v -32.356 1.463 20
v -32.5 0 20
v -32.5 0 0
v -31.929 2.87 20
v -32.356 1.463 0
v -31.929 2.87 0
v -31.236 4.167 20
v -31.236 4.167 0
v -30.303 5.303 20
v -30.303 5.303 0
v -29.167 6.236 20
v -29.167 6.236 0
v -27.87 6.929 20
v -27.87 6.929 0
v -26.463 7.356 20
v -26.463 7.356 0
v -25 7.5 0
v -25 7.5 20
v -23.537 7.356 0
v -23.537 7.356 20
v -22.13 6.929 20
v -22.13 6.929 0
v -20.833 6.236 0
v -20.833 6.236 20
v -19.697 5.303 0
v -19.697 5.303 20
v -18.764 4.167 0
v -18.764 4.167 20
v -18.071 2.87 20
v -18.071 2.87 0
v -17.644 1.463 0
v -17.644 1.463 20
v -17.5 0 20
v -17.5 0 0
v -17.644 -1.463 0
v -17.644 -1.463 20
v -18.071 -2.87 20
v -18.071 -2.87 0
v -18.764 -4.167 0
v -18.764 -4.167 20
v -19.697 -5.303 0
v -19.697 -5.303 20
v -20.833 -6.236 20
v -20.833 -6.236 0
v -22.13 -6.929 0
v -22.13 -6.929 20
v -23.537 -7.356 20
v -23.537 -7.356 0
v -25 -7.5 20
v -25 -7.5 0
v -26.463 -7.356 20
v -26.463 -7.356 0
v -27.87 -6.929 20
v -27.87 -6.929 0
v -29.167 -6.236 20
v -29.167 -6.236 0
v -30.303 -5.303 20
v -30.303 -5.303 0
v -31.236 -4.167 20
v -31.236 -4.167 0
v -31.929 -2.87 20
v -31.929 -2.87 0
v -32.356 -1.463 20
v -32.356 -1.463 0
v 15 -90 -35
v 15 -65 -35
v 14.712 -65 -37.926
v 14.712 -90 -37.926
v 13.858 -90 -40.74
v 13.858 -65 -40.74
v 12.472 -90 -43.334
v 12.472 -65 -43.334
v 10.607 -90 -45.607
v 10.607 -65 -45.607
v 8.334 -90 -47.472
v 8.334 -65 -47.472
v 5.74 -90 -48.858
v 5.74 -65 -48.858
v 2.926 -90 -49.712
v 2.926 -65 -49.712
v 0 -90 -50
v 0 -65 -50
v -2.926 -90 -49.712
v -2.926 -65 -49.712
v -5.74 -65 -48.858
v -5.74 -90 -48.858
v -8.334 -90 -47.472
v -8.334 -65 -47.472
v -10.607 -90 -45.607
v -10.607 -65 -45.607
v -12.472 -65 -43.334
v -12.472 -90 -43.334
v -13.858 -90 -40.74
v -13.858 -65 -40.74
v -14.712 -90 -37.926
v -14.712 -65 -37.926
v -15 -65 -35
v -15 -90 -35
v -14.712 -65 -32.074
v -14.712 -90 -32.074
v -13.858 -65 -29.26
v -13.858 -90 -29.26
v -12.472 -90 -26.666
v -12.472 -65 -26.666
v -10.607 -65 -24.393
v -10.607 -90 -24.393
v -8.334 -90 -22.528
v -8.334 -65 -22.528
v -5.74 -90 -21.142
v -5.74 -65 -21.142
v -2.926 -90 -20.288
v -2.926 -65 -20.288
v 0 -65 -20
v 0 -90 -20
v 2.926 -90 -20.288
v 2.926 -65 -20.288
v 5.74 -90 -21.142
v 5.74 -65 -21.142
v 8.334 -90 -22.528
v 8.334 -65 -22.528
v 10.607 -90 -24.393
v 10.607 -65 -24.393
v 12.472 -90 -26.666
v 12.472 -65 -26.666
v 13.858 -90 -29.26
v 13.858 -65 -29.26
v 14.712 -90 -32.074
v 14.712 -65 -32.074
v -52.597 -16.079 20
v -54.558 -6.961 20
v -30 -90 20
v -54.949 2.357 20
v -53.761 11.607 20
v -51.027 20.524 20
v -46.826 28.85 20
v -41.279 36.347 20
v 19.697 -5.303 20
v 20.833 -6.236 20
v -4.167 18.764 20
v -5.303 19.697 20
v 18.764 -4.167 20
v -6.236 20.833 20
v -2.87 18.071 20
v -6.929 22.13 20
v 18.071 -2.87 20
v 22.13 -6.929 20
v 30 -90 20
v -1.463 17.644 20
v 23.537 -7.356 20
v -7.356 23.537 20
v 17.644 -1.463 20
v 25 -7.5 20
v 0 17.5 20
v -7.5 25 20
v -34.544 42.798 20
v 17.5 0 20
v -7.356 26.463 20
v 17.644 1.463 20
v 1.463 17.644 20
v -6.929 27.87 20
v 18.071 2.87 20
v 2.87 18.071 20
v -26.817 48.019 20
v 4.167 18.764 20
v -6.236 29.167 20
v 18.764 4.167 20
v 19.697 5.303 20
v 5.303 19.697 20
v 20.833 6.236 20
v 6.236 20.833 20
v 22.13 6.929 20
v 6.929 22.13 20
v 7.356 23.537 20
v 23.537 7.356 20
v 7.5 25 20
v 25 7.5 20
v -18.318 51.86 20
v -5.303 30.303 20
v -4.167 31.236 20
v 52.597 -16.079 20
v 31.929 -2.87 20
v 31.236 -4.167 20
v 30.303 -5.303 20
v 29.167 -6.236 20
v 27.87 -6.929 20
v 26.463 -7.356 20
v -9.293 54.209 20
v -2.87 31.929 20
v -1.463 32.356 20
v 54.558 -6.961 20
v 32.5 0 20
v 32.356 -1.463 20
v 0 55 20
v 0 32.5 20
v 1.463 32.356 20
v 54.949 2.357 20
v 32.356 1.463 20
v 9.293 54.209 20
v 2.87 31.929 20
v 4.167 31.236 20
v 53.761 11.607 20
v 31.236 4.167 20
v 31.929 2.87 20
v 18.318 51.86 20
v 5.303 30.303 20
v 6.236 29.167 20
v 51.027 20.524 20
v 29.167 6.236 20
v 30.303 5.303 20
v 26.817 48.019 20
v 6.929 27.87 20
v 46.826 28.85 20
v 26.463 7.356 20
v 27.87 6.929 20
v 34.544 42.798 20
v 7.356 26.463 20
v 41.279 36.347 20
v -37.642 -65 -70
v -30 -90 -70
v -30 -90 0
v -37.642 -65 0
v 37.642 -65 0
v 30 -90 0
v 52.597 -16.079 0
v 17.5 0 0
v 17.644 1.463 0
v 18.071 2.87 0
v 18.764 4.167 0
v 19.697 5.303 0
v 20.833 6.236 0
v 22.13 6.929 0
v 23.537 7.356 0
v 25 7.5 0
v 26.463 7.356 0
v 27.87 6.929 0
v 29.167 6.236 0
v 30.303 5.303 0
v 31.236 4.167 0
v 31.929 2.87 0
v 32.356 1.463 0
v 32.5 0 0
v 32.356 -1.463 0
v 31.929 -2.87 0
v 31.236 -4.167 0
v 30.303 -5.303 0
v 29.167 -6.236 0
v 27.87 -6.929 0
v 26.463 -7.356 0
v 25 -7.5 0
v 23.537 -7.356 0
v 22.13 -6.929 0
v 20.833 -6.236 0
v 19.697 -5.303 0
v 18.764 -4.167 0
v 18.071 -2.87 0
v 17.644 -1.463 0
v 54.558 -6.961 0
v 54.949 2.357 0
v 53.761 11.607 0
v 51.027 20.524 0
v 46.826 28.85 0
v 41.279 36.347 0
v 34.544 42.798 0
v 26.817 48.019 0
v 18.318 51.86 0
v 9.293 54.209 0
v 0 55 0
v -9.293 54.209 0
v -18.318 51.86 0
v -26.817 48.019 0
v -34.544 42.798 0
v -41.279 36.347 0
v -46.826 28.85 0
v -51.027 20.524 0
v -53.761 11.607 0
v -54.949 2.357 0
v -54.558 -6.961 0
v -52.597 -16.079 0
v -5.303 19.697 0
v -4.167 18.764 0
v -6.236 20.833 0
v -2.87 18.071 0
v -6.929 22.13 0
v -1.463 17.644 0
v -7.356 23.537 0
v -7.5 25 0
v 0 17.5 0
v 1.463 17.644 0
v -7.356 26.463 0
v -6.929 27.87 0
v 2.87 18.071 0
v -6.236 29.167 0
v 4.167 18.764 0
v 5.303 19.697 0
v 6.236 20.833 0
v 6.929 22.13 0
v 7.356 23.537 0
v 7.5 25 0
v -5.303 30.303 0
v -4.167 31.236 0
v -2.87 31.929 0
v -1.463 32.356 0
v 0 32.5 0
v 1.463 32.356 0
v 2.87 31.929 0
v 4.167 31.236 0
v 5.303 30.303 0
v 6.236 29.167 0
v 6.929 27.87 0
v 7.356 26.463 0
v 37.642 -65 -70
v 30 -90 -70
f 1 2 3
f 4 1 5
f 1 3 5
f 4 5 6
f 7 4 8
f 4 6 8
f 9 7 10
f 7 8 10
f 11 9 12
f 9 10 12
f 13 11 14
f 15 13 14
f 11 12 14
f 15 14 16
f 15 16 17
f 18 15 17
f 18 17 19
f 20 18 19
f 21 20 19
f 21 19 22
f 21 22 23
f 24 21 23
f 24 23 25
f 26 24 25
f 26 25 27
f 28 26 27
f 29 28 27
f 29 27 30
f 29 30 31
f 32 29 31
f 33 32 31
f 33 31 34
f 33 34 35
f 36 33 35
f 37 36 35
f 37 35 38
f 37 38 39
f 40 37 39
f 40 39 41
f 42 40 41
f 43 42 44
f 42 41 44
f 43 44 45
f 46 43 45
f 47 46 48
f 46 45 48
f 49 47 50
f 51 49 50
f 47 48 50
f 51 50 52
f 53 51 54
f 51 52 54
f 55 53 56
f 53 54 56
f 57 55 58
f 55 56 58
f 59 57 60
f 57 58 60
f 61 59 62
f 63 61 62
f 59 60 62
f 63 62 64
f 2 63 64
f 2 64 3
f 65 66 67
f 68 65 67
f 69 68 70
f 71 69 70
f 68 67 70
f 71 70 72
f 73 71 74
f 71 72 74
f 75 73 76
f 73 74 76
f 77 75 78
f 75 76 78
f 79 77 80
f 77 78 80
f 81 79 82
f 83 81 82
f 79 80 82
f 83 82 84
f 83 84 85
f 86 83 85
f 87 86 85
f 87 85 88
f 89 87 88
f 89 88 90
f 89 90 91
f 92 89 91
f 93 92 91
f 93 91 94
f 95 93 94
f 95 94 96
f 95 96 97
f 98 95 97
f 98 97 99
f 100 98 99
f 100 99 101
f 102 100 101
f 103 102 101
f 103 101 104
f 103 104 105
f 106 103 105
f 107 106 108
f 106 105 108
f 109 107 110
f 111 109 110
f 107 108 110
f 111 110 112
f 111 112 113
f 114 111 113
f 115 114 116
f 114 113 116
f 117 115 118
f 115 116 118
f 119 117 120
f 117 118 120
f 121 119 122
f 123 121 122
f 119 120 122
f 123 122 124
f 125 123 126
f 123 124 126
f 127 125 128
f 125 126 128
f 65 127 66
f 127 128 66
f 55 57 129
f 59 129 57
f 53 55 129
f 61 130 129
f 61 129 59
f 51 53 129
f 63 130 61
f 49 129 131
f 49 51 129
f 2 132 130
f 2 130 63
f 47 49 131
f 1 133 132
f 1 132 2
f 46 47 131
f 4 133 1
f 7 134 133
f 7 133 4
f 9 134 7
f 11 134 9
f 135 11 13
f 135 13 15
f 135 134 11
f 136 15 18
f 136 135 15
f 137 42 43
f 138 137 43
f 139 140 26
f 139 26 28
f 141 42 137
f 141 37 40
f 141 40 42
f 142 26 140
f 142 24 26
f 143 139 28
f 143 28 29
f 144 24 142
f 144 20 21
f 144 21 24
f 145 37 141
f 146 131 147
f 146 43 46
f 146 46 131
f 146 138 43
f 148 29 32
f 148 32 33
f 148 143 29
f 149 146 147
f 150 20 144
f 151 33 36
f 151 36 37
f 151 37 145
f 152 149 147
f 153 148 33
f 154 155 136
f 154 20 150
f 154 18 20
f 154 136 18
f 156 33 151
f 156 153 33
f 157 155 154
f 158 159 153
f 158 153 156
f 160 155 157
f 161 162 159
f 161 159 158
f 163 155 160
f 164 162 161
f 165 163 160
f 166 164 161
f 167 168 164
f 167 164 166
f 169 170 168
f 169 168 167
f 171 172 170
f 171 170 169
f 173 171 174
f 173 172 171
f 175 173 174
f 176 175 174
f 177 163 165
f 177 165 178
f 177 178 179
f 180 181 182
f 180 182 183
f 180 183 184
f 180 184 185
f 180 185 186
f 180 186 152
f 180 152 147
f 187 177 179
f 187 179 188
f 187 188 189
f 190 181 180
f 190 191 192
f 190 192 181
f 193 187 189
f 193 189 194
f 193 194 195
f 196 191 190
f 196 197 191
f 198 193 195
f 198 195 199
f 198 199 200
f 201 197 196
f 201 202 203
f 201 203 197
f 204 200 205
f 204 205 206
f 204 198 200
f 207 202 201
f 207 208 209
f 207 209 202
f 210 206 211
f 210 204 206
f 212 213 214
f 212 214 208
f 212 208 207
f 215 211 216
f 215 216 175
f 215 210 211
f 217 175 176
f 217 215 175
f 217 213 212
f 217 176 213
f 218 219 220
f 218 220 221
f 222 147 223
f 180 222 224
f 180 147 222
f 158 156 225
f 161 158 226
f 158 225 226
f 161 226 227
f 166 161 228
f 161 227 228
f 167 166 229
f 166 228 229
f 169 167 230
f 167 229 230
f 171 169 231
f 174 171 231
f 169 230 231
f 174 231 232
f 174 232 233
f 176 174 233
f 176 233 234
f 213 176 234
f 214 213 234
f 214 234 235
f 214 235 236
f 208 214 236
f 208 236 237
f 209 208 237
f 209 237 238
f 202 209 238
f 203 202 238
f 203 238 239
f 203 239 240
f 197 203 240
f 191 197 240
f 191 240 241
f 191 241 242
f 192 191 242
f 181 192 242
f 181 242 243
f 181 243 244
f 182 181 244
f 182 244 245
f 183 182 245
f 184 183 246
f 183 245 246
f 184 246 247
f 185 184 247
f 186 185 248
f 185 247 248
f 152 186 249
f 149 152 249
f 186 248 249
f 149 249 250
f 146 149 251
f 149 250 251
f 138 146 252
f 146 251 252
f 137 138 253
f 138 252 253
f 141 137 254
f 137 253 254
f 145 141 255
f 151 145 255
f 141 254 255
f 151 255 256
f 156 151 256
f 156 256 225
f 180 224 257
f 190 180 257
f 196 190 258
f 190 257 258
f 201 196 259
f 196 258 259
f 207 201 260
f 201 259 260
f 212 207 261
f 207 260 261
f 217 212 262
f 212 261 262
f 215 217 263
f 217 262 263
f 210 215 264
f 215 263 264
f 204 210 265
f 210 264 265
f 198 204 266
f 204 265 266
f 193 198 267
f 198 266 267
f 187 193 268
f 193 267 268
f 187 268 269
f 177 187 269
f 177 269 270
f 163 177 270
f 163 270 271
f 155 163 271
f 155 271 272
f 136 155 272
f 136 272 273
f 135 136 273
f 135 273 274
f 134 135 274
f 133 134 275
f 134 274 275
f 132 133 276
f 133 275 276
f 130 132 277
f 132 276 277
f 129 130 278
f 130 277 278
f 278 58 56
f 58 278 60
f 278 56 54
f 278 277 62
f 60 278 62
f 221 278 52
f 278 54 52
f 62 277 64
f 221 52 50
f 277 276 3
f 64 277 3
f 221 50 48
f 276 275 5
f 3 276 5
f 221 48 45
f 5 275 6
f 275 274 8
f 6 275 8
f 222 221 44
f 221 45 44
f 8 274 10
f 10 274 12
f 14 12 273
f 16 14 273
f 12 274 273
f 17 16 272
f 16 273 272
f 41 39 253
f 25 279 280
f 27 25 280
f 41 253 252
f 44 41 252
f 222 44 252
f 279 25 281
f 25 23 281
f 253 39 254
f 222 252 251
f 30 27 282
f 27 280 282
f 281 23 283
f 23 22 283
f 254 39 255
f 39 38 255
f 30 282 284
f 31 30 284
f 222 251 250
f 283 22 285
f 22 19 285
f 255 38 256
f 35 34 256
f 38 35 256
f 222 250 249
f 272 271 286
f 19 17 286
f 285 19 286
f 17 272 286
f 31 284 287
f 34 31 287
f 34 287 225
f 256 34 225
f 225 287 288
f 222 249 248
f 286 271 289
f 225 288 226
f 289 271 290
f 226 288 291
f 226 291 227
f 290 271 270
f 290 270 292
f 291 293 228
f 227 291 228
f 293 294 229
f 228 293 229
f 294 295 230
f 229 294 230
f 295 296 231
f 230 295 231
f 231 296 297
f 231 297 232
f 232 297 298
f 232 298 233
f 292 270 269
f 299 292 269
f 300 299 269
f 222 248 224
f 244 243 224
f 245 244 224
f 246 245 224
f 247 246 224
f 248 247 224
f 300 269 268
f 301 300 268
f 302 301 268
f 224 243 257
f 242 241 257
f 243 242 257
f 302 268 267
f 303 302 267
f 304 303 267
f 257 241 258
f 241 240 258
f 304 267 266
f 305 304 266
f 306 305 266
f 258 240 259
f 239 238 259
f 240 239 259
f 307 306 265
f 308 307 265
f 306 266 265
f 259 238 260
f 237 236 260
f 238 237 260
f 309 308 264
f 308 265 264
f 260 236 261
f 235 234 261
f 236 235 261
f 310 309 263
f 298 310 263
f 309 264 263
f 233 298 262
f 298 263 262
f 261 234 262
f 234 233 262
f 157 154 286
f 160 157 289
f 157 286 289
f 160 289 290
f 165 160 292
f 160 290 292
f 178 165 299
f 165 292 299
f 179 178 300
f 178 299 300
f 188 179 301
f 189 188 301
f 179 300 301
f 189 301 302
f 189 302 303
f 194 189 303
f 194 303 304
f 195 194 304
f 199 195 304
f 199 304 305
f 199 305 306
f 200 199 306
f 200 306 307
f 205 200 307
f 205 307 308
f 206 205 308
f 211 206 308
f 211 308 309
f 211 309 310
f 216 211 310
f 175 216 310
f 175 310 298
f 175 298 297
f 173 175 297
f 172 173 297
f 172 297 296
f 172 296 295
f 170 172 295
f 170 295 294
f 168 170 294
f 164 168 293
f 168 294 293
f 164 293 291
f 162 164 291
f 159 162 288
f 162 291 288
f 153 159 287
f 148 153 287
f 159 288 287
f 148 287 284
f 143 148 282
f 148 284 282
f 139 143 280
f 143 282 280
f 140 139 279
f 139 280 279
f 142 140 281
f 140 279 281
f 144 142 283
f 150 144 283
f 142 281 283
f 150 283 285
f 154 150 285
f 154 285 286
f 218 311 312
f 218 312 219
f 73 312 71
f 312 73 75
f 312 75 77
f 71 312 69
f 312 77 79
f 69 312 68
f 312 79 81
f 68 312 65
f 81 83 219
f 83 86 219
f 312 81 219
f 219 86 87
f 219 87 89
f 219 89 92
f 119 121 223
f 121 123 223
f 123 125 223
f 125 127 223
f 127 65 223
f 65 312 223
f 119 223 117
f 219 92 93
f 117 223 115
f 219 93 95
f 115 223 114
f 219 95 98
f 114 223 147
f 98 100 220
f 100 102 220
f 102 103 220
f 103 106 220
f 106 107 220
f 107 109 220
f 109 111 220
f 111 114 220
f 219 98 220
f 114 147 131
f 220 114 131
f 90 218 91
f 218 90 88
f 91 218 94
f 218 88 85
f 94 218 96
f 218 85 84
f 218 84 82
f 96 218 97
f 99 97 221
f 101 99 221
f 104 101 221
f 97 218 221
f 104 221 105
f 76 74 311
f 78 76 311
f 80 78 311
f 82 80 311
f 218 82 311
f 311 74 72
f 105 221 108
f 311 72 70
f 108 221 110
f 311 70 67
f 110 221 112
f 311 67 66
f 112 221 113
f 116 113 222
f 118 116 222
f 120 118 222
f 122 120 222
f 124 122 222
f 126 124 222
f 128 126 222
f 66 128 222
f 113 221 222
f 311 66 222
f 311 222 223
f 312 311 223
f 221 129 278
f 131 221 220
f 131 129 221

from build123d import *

# Parameters (mm, degrees)
SKETCH1_R           = 55
BOSS_EXTRUDE1_DEPTH = 20
BOSS_EXTRUDE2_DEPTH = 20
CUT_EXTRUDE2_REACH  = 22
SKETCH4_R           = 7.5
BOSS_EXTRUDE3_DEPTH = 70
CUT_EXTRUDE3_REACH  = 27
SKETCH6_R           = 15


with BuildPart() as part:
    # Sketch1 → Boss-Extrude1 (new body)
    with BuildSketch(Plane.XY):
        Circle(SKETCH1_R)
    extrude(amount=BOSS_EXTRUDE1_DEPTH)

    # Sketch2 → Boss-Extrude2 (add)
    with BuildSketch(Plane.XY.offset(20)):
        with BuildLine():
            ThreePointArc((52.597301626, -16.078677236), (0, -55), (-52.597301626, -16.078677236))
            Line((-52.597301626, -16.078677236), (-30, -90))
            Line((-30, -90), (30, -90))
            Line((30, -90), (52.597301626, -16.078677236))
        make_face()
    extrude(amount=-BOSS_EXTRUDE2_DEPTH)

    # Sketch4 → Cut-Extrude2 (cut, up to next)
    with BuildSketch(Plane(origin=(0, 0, 0), x_dir=(-1, 0, 0), z_dir=(0, 0, -1)), mode=Mode.PRIVATE) as cut_extrude2_sk1:
        with Locations((0, 25)):
            Circle(SKETCH4_R)
    cut_extrude2_tool1 = extrude(cut_extrude2_sk1.sketch, amount=-CUT_EXTRUDE2_REACH, mode=Mode.PRIVATE) & part.part
    add(cut_extrude2_tool1.solids().sort_by_distance((0, 25, 0))[0], mode=Mode.SUBTRACT)
    # Sketch4 → Cut-Extrude2 (cut, up to next)
    with BuildSketch(Plane(origin=(0, 0, 0), x_dir=(-1, 0, 0), z_dir=(0, 0, -1)), mode=Mode.PRIVATE) as cut_extrude2_sk2:
        with Locations((-25, 0)):
            Circle(SKETCH4_R)
    cut_extrude2_tool2 = extrude(cut_extrude2_sk2.sketch, amount=-CUT_EXTRUDE2_REACH, mode=Mode.PRIVATE) & part.part
    add(cut_extrude2_tool2.solids().sort_by_distance((25, 0, 0))[0], mode=Mode.SUBTRACT)
    # Sketch4 → Cut-Extrude2 (cut, up to next)
    with BuildSketch(Plane(origin=(0, 0, 0), x_dir=(-1, 0, 0), z_dir=(0, 0, -1)), mode=Mode.PRIVATE) as cut_extrude2_sk3:
        with Locations((25, 0)):
            Circle(SKETCH4_R)
    cut_extrude2_tool3 = extrude(cut_extrude2_sk3.sketch, amount=-CUT_EXTRUDE2_REACH, mode=Mode.PRIVATE) & part.part
    add(cut_extrude2_tool3.solids().sort_by_distance((-25, 0, 0))[0], mode=Mode.SUBTRACT)

    # Sketch5 → Boss-Extrude3 (add)
    with BuildSketch(Plane(origin=(0, 0, 0), x_dir=(-1, 0, 0), z_dir=(0, 0, -1))):
        Polygon((37.642348913, -65), (-37.642348913, -65), (-30, -90), (30, -90), align=None)
    extrude(amount=BOSS_EXTRUDE3_DEPTH)

    # Sketch6 → Cut-Extrude3 (cut, up to next)
    with BuildSketch(Plane(origin=(0, -65, 0), x_dir=(1, 0, 0), z_dir=(0, 1, 0)), mode=Mode.PRIVATE) as cut_extrude3_sk1:
        with Locations((0, 35)):
            Circle(SKETCH6_R)
    cut_extrude3_tool1 = extrude(cut_extrude3_sk1.sketch, amount=-CUT_EXTRUDE3_REACH, mode=Mode.PRIVATE) & part.part
    add(cut_extrude3_tool1.solids().sort_by_distance((0, -65, -35))[0], mode=Mode.SUBTRACT)


solid = part.part
